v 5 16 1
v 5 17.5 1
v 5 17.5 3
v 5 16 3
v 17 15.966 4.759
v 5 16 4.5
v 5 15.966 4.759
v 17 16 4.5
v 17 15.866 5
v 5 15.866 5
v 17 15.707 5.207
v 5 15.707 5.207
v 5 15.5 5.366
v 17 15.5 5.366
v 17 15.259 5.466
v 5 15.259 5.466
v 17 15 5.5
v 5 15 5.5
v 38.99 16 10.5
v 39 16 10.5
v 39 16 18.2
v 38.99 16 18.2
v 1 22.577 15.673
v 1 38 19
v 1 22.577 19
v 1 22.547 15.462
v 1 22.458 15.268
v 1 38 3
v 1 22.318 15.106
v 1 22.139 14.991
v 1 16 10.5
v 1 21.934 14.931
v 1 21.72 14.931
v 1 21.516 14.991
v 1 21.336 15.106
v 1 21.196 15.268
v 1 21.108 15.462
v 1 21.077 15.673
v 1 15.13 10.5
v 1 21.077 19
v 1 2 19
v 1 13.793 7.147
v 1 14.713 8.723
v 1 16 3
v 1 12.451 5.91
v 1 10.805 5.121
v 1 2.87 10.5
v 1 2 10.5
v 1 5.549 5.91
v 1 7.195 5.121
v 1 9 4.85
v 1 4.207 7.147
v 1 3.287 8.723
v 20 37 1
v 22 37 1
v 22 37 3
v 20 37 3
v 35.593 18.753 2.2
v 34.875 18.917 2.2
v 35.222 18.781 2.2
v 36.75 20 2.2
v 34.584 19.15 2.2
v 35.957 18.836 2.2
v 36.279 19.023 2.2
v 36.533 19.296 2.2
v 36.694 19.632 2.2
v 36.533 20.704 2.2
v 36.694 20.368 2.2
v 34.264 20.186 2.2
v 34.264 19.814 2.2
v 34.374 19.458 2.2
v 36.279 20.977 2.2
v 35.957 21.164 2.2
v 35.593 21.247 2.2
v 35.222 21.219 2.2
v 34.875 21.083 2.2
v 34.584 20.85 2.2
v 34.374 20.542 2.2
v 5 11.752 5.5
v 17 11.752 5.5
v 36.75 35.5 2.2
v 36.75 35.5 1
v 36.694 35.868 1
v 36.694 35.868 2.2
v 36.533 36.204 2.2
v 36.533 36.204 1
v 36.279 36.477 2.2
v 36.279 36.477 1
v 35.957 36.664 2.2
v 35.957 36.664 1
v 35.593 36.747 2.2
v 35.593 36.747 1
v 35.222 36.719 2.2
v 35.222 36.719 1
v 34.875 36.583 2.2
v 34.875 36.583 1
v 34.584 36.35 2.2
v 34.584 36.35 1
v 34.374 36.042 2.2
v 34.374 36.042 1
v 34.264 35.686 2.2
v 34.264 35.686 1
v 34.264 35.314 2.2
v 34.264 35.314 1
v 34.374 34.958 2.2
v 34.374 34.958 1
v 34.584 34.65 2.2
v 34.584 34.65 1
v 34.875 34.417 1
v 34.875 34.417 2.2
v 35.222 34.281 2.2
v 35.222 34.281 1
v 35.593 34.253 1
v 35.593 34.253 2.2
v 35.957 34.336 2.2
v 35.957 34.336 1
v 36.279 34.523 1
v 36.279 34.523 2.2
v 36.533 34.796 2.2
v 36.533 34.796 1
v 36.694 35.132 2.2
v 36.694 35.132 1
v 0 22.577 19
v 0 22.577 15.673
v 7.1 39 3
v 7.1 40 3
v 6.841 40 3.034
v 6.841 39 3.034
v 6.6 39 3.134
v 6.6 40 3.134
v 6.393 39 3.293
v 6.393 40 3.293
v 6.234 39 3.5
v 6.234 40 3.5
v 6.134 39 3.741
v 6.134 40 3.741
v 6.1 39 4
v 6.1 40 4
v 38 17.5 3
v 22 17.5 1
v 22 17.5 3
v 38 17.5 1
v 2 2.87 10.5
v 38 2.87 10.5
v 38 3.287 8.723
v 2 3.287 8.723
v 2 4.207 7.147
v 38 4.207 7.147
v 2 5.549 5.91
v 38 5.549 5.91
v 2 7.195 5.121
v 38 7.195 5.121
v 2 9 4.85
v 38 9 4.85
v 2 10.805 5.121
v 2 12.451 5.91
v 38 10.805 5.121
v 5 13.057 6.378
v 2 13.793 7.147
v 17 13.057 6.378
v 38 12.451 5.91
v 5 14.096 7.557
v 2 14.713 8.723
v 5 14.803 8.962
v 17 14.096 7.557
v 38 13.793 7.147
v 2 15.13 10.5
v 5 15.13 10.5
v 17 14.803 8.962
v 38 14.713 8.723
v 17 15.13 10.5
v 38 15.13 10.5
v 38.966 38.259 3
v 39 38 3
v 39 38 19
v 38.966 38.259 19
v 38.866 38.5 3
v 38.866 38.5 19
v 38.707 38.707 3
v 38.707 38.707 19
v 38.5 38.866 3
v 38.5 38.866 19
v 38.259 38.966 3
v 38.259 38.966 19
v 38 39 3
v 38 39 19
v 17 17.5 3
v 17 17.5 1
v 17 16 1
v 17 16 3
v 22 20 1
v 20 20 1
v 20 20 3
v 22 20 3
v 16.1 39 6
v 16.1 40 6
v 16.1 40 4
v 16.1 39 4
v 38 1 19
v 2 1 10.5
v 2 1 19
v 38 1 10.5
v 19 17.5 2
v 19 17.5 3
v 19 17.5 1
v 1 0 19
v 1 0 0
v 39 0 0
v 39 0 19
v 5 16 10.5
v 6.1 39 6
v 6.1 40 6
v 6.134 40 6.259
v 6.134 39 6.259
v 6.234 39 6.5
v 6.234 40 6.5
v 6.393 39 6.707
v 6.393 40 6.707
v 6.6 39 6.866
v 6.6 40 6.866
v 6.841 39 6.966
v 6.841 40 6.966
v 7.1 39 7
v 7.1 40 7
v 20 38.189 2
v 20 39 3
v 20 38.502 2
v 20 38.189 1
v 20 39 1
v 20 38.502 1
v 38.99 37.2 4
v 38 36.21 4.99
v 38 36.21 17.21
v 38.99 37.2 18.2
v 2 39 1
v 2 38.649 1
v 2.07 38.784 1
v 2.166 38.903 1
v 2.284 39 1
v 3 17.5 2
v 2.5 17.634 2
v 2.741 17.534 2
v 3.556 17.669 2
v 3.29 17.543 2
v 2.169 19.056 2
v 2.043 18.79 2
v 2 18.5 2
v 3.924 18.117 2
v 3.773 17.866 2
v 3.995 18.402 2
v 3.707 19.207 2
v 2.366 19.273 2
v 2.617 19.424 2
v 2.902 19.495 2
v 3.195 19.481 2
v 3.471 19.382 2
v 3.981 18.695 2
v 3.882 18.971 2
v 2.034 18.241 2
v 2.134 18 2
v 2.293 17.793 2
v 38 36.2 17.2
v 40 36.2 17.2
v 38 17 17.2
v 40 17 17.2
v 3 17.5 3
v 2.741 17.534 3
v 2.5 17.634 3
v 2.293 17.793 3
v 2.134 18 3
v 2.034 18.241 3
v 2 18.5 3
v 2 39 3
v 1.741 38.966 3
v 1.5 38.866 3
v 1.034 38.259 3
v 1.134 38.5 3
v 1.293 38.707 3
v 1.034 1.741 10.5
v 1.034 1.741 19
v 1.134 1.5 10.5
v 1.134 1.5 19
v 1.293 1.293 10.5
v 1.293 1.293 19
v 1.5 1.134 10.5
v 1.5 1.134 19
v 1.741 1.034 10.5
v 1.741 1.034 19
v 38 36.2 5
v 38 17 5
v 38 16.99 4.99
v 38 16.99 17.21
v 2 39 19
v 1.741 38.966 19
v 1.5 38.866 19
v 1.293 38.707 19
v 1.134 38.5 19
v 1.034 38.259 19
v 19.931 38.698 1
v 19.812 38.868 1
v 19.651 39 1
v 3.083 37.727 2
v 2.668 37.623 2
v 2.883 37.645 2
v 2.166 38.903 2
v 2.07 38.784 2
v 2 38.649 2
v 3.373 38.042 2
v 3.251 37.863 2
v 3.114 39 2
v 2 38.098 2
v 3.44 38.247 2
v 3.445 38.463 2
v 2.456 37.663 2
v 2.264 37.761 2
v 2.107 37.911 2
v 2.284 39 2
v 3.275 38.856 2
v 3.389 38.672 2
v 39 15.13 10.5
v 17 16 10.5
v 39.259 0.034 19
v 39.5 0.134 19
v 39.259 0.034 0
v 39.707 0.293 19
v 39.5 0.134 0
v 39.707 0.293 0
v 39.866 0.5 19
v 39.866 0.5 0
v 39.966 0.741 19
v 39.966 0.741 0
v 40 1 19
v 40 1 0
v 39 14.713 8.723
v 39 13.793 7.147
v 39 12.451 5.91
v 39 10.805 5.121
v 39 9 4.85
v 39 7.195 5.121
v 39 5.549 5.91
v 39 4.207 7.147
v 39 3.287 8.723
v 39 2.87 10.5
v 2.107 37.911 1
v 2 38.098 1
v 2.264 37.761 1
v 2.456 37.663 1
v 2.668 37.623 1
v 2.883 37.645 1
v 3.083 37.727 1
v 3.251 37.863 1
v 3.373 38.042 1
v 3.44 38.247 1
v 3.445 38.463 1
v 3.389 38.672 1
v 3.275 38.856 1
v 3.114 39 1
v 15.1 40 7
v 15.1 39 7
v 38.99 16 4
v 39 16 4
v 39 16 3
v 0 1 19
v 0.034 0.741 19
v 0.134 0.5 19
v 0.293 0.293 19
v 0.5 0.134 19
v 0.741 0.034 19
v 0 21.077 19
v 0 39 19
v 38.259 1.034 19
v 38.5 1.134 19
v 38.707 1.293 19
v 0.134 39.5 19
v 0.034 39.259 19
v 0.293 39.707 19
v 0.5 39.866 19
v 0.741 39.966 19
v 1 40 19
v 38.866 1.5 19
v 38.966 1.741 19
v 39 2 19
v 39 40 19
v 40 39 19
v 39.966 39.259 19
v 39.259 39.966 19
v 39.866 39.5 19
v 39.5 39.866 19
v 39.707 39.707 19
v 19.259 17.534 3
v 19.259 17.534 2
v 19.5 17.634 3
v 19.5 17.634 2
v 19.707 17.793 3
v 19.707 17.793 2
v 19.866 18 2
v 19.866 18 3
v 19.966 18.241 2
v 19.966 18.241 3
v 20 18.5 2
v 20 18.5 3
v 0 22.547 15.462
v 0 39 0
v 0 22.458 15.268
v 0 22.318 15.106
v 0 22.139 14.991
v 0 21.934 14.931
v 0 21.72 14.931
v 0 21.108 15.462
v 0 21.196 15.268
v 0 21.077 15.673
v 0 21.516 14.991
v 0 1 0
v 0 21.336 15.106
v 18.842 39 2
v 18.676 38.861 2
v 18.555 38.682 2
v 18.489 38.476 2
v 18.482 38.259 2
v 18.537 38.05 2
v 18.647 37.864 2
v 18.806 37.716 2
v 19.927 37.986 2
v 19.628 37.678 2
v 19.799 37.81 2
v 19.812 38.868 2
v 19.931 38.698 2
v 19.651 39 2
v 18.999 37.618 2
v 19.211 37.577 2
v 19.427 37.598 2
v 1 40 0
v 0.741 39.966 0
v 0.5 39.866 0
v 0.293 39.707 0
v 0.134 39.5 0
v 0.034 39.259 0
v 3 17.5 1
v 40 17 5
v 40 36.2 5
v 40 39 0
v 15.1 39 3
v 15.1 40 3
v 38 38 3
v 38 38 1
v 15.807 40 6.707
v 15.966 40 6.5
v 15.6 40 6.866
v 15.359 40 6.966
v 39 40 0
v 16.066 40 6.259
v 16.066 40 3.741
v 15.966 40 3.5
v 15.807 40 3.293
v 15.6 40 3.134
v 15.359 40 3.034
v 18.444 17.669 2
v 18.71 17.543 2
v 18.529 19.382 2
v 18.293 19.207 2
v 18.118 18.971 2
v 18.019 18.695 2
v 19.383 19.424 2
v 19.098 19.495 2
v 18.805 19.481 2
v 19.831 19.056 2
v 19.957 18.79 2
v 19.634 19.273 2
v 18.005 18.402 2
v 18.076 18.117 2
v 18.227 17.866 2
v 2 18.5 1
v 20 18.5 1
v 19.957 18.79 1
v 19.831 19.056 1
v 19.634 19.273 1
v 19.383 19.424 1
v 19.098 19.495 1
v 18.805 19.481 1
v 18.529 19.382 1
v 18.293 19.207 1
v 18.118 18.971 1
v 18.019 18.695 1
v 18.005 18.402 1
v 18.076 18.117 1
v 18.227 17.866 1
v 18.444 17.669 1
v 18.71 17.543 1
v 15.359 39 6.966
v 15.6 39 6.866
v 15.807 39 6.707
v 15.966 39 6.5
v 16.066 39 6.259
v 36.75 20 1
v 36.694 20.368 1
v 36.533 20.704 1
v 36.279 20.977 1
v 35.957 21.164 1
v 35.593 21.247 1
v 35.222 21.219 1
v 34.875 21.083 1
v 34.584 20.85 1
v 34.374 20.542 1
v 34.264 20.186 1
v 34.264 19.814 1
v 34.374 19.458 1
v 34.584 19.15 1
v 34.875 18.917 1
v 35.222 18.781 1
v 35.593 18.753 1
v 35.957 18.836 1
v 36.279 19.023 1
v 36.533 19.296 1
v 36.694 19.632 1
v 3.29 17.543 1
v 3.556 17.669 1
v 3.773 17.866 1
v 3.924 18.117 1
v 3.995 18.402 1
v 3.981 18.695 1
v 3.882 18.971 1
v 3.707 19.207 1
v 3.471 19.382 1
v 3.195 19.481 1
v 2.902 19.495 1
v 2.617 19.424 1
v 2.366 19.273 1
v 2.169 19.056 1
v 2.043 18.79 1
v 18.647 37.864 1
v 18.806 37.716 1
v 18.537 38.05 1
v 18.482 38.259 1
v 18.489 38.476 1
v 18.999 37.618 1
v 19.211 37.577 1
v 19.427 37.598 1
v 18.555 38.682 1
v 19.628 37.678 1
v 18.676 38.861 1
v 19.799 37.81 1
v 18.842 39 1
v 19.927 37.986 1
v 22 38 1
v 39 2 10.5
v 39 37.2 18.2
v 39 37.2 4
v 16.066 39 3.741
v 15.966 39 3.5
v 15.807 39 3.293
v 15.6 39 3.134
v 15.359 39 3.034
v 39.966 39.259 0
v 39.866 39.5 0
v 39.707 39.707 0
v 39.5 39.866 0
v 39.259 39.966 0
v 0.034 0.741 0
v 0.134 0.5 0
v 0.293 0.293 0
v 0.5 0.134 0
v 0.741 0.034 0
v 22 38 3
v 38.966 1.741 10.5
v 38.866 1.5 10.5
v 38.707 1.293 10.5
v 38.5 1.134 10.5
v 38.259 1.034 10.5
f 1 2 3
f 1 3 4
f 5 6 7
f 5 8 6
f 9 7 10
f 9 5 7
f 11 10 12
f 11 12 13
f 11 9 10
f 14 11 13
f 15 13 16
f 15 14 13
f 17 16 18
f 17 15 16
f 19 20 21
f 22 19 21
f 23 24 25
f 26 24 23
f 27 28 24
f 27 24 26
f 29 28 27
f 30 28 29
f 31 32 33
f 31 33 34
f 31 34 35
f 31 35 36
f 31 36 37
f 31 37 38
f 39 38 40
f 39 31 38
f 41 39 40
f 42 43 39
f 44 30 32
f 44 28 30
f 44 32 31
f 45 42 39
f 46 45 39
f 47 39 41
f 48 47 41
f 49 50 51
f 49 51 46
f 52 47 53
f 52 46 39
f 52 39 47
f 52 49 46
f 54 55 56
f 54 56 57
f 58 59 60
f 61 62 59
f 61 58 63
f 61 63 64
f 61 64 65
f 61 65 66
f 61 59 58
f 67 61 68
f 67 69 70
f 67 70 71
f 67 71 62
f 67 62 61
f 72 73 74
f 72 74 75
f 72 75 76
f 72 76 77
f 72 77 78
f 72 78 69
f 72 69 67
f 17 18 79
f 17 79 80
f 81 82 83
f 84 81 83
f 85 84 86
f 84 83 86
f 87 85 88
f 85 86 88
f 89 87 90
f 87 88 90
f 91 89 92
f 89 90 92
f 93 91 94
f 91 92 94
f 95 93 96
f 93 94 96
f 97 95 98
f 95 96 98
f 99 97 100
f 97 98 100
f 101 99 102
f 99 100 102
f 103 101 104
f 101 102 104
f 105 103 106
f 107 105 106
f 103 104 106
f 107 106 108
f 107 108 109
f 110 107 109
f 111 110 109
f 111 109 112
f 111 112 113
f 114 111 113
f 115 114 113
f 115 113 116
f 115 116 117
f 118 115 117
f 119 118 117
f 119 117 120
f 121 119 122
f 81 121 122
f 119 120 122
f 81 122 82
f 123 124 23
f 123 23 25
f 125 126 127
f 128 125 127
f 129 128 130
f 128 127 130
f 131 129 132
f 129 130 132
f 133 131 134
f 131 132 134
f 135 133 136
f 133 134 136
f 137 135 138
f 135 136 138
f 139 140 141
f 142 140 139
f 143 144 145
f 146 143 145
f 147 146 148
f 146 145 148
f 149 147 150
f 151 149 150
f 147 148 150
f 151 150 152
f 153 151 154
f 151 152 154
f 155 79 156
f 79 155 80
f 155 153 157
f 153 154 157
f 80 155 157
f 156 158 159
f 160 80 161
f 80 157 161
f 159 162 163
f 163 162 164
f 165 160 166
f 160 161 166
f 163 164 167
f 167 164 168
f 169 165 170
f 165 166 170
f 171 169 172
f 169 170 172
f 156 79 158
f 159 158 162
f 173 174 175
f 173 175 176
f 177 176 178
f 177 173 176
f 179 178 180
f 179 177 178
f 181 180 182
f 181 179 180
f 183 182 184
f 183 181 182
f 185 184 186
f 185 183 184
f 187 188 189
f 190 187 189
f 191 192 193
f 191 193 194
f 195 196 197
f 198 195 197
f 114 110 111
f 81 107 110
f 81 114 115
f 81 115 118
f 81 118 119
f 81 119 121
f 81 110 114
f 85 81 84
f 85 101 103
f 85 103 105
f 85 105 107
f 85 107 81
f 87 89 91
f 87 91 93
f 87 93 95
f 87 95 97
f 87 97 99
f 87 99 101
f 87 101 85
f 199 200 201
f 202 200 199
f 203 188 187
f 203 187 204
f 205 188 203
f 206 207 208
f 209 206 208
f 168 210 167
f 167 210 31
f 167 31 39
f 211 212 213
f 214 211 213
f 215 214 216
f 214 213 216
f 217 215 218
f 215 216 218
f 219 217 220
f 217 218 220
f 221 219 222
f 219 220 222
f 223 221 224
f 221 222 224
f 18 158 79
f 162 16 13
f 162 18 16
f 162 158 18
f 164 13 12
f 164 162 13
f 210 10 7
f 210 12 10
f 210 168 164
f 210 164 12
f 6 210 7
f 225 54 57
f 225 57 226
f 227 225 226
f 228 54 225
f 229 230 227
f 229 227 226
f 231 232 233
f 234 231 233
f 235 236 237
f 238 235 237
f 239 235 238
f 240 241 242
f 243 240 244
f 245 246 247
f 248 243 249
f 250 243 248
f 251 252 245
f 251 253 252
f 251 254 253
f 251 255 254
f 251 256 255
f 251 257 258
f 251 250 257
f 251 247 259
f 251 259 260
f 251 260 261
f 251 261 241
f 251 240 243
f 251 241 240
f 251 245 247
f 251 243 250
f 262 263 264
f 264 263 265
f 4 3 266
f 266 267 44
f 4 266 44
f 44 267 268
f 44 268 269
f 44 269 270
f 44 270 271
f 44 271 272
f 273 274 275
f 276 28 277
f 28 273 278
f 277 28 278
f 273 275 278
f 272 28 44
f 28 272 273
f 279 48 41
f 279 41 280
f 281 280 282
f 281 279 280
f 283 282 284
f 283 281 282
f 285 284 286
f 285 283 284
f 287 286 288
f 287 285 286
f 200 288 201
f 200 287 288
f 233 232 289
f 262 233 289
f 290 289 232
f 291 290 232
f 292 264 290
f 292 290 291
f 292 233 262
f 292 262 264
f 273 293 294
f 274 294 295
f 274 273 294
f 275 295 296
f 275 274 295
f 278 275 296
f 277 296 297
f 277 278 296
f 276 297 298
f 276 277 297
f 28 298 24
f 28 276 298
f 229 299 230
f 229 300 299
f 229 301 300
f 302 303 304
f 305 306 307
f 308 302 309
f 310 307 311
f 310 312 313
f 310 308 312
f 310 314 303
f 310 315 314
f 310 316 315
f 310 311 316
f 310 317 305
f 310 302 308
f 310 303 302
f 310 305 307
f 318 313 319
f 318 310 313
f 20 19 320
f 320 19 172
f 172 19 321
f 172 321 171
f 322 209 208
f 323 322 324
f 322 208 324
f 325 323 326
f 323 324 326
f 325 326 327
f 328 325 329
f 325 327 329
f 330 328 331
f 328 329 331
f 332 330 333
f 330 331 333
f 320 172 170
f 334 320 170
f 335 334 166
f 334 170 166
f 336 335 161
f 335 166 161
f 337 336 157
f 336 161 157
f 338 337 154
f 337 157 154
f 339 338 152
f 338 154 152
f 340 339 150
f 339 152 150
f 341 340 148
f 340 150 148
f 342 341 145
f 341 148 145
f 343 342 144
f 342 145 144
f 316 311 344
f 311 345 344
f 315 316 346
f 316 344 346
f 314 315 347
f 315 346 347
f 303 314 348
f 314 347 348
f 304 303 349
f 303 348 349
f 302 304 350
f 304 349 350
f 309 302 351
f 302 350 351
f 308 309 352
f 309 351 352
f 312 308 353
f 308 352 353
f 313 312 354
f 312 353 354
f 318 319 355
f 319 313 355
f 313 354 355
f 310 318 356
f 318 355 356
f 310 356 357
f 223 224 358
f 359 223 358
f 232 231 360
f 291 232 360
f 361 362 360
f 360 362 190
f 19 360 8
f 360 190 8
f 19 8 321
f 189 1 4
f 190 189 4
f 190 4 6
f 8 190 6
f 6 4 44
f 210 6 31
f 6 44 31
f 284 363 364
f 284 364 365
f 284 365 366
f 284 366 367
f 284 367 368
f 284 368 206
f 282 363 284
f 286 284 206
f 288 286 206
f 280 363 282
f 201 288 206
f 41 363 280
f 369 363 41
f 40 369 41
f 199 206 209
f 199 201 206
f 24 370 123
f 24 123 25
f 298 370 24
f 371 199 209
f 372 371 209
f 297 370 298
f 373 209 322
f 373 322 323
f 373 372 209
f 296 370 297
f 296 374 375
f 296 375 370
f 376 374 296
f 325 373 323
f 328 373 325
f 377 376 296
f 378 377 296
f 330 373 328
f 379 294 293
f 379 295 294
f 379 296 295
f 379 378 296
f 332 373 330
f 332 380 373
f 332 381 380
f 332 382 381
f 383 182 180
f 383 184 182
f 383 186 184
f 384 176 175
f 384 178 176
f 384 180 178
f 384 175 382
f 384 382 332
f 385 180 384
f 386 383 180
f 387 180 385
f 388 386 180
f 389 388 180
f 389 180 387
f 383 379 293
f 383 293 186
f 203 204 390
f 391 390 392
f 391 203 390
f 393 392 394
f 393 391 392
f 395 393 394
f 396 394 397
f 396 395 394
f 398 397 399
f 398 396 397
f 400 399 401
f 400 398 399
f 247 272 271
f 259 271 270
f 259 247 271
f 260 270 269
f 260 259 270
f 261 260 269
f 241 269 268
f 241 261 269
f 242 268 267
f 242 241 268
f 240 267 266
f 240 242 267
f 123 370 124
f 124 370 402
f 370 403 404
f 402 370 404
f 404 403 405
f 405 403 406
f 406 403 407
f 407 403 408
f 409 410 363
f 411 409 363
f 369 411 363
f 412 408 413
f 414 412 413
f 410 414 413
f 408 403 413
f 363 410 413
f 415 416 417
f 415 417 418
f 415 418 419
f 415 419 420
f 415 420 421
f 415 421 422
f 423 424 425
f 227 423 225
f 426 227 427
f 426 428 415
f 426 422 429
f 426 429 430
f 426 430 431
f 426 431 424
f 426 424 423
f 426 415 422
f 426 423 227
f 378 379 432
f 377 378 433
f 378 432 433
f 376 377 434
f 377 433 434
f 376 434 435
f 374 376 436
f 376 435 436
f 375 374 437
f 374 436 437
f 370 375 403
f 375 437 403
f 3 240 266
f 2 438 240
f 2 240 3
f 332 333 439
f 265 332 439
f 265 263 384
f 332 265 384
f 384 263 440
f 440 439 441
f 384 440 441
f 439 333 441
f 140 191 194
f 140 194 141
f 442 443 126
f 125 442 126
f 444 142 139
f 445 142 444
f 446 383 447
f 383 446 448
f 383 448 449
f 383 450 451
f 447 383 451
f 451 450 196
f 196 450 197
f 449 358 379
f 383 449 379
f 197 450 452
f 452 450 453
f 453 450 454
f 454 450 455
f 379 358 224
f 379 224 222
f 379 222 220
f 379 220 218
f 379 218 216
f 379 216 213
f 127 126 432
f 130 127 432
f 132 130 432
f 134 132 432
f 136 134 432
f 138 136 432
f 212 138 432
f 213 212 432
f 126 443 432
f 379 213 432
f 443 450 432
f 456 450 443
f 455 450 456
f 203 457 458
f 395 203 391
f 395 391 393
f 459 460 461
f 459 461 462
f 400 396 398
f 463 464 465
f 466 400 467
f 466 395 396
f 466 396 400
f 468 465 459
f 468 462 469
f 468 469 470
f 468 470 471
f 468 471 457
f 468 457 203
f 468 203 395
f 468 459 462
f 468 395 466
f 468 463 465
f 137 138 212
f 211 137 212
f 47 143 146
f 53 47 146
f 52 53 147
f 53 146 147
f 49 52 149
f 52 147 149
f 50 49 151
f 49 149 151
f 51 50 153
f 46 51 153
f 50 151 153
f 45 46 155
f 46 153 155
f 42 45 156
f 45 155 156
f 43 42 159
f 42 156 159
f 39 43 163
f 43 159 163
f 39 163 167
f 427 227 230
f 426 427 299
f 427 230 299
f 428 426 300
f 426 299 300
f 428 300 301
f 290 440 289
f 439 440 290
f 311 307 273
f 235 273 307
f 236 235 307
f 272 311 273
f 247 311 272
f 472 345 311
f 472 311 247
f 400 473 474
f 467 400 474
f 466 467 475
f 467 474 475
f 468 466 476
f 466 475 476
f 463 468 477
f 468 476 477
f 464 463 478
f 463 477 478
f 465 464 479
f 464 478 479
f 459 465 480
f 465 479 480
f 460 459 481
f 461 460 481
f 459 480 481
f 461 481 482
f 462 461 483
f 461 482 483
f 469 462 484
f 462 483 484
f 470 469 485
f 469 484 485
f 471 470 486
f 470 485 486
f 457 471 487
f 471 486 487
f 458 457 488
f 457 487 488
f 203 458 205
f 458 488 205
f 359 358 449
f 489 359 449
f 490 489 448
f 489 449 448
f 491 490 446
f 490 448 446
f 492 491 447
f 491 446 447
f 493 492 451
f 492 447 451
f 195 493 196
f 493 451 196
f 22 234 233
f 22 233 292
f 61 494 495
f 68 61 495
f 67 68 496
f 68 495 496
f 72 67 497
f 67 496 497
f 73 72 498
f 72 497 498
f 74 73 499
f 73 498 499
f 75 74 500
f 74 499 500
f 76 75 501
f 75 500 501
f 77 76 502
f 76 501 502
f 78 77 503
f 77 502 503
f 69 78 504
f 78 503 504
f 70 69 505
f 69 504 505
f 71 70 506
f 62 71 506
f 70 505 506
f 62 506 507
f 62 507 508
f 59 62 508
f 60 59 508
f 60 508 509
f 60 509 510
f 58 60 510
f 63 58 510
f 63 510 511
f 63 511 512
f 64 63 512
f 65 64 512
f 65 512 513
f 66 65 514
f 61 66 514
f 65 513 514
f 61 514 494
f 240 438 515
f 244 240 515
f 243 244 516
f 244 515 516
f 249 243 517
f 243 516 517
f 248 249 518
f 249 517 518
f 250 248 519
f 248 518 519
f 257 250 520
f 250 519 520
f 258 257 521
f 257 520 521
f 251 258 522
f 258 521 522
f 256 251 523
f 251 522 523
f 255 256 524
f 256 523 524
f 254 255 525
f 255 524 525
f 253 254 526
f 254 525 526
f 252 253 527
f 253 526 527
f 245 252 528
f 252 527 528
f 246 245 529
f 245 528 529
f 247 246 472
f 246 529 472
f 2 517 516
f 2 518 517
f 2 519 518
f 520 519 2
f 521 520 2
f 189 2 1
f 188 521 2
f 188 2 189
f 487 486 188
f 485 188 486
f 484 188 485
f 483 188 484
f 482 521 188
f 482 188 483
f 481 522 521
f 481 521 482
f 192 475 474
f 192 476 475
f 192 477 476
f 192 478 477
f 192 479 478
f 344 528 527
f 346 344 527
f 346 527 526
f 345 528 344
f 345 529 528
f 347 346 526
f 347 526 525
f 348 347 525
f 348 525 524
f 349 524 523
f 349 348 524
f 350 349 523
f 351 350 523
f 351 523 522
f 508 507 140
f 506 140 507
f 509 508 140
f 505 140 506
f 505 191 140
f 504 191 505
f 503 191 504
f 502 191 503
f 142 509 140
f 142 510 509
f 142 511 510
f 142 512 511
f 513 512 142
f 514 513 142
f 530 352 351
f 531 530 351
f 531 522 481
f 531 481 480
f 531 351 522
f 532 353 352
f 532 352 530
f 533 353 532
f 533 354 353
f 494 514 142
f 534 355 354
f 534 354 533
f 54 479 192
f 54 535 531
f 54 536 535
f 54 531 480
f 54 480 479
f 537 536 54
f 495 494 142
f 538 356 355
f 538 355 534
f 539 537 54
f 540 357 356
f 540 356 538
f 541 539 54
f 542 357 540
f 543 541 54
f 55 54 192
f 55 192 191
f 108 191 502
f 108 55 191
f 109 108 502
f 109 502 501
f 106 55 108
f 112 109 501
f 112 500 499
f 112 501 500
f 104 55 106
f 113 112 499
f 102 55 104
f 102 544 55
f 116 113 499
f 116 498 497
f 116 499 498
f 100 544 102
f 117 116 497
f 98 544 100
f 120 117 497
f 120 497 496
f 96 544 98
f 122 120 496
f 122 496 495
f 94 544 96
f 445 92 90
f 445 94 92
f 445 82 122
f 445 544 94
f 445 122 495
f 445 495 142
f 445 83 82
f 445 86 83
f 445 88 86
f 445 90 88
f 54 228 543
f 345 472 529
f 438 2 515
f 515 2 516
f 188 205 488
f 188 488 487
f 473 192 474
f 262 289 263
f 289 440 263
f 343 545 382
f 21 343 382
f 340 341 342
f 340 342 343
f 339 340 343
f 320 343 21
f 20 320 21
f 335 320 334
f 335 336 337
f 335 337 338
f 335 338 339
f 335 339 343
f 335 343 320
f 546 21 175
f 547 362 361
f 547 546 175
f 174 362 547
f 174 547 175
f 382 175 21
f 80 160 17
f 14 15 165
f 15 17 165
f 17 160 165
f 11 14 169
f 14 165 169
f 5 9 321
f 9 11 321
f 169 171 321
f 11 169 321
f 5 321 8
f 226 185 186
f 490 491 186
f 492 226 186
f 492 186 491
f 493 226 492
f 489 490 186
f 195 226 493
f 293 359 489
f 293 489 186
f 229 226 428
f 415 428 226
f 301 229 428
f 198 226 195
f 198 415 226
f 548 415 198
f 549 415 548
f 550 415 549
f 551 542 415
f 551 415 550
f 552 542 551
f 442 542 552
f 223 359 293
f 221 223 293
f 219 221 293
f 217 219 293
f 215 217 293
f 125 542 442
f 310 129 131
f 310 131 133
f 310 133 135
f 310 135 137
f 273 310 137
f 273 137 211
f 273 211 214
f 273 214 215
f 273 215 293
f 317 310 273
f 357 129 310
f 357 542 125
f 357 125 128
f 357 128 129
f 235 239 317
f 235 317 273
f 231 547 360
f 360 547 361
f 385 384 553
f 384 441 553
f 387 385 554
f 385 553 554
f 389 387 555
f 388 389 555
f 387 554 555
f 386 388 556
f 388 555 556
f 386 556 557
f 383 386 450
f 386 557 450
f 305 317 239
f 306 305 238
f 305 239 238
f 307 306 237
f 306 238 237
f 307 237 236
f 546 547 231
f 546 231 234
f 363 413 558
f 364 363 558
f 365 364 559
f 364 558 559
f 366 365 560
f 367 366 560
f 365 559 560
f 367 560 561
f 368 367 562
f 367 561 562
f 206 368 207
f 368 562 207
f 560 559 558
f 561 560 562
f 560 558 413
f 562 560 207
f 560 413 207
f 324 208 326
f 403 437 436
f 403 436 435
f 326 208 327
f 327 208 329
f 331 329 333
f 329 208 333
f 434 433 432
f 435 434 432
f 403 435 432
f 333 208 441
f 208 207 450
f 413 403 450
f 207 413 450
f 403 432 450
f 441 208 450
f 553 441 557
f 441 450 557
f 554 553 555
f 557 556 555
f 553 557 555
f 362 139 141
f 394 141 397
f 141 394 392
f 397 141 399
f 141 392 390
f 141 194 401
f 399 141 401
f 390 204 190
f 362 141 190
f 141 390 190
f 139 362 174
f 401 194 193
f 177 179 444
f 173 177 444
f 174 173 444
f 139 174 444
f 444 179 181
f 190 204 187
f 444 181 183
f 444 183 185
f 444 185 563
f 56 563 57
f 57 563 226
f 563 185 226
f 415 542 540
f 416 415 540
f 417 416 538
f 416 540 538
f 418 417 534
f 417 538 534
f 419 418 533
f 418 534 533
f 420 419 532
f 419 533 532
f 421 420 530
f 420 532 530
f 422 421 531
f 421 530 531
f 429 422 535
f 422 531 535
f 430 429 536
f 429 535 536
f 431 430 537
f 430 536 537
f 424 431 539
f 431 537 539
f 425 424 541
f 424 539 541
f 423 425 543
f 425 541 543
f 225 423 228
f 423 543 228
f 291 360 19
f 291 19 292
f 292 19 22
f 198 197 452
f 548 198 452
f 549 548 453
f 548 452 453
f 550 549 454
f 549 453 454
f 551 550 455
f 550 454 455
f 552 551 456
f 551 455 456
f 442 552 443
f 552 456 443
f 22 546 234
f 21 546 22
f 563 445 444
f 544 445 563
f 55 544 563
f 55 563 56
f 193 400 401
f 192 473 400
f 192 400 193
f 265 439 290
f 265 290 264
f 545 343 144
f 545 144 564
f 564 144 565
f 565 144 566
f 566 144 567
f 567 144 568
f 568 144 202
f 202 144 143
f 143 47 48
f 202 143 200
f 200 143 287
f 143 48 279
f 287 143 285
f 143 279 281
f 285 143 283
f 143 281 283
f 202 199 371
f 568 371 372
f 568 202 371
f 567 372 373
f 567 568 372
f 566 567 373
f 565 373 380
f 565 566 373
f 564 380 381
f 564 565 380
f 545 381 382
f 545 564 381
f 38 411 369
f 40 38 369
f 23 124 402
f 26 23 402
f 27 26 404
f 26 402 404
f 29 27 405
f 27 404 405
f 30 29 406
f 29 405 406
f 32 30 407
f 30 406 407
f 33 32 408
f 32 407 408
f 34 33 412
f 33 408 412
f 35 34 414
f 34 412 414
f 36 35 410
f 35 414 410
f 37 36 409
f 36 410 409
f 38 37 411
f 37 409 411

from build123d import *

# Parameters (mm, degrees)
PAD_DEPTH       = 1
PAD001_DEPTH    = 18
SKETCH002_W     = 19.2
SKETCH002_H     = 12.2
POCKET_DEPTH    = 5
SKETCH003_W     = 21.2
SKETCH003_H     = 14.2
SKETCH003_W_2   = 19.2
SKETCH003_H_2   = 12.2
PAD002_DEPTH    = 1
CHAMFER_SIZE    = 0.99
PAD003_DEPTH    = 2
CHAMFER001_SIZE = 1.8
SKETCH005_W     = 36
SKETCH005_H     = 15
PAD004_DEPTH    = 2.5
PAD004_FACE29_W = 15
PAD004_FACE29_H = 36
PAD005_DEPTH    = 10
SKETCH006_R     = 1
SKETCH006_R_2   = 0.751416
SKETCH006_R_3   = 0.769216
PAD006_DEPTH    = 1
SKETCH007_R     = 1.25
PAD007_DEPTH    = 1.2
PAD007_FACE39_W = 15
PAD007_FACE39_H = 36
POCKET001_DEPTH = 5
SKETCH008_R     = 6.15
POCKET002_DEPTH = 19
PAD008_DEPTH    = 1
PAD009_DEPTH    = 1
SKETCH009_W     = 12
SKETCH009_H     = 5
POCKET003_DEPTH = 5
FILLET_R        = 1
POCKET004_DEPTH = 5
POCKET005_DEPTH = 5


with BuildPart() as part:
    # Sketch → Pad (new body)
    with BuildSketch(Plane.XY):
        with BuildLine():
            Line((1, 0), (39, 0))
            ThreePointArc((39, 0), (39.707107, 0.292893), (40, 1))
            Line((40, 1), (40, 39))
            ThreePointArc((40, 39), (39.707107, 39.707107), (39, 40))
            Line((39, 40), (1, 40))
            ThreePointArc((1, 40), (0.292893, 39.707107), (0, 39))
            Line((0, 39), (0, 1))
            ThreePointArc((0, 1), (0.292893, 0.292893), (1, 0))
        make_face()
    extrude(amount=PAD_DEPTH)

    # Sketch001 (on Face10 of Pad) → Pad001 (join)
    with BuildSketch(Plane.XY.offset(1)):
        with BuildLine():
            Line((1, 0), (39, 0))
            ThreePointArc((39, 0), (39.707107, 0.292893), (40, 1))
            Line((40, 1), (40, 39))
            ThreePointArc((40, 39), (39.707107, 39.707107), (39, 40))
            Line((39, 40), (1, 40))
            ThreePointArc((1, 40), (0.292893, 39.707107), (0, 39))
            Line((0, 39), (0, 1))
            ThreePointArc((0, 1), (0.292893, 0.292893), (1, 0))
        make_face()
        with BuildLine():
            Line((2, 1), (38, 1))
            ThreePointArc((38, 1), (38.707107, 1.292893), (39, 2))
            Line((39, 2), (39, 38))
            ThreePointArc((39, 38), (38.707107, 38.707107), (38, 39))
            Line((38, 39), (2, 39))
            ThreePointArc((2, 39), (1.292893, 38.707107), (1, 38))
            Line((1, 38), (1, 2))
            ThreePointArc((1, 2), (1.292893, 1.292893), (2, 1))
        make_face(mode=Mode.SUBTRACT)
    extrude(amount=PAD001_DEPTH)

    # Sketch002 (on Face14 of Pad001) → Pocket (cut)
    with BuildSketch(Plane.YZ.offset(40)):
        with Locations((26.6, 11.1)):
            Rectangle(SKETCH002_W, SKETCH002_H)
    extrude(amount=-POCKET_DEPTH, mode=Mode.SUBTRACT)

    # Sketch003 (on Face17 of Pocket) → Pad002 (join)
    with BuildSketch(Plane(origin=(39, 0, 0), x_dir=(0, -1, 0), z_dir=(-1, 0, 0))):
        with Locations((-26.6, 11.1)):
            Rectangle(SKETCH003_W, SKETCH003_H)
        with Locations((-26.6, 11.1)):
            Rectangle(SKETCH003_W_2, SKETCH003_H_2, mode=Mode.SUBTRACT)
    extrude(amount=PAD002_DEPTH)

    # Chamfer
    chamfer_edges = [part.edges().sort_by_distance(p)[0] for p in [
        (38, 26.6, 18.2),
        (38, 16, 11.1),
        (38, 26.6, 4),
        (38, 37.2, 11.1),
    ]]
    chamfer(chamfer_edges, length=CHAMFER_SIZE)

    # Sketch004 (on Face11 of Chamfer) → Pad003 (join)
    with BuildSketch(Plane.XY.offset(1)):
        with BuildLine():
            Line((2, 39), (2, 18.5))
            ThreePointArc((2, 18.5), (2.292893, 17.792893), (3, 17.5))
            Line((3, 17.5), (5, 17.5))
            Line((5, 17.5), (5, 14))
            Line((5, 14), (17, 14))
            Line((17, 17.5), (17, 14))
            Line((17, 17.5), (19, 17.5))
            ThreePointArc((19, 17.5), (19.707107, 17.792893), (20, 18.5))
            Line((20, 18.5), (20, 20))
            Line((20, 20), (22, 20))
            Line((22, 20), (22, 17.5))
            Line((22, 17.5), (38, 17.5))
            Line((38, 17.5), (38, 38))
            Line((38, 38), (22, 38))
            Line((22, 38), (22, 37))
            Line((22, 37), (20, 37))
            Line((20, 37), (20, 39))
            Line((20, 39), (39, 39))
            Line((39, 1), (39, 39))
            Line((1, 1), (39, 1))
            Line((1, 39), (1, 1))
            Line((1, 39), (2, 39))
        make_face()
    extrude(amount=PAD003_DEPTH)

    # Chamfer001
    chamfer001_edges = [part.edges().sort_by_distance(p)[0] for p in [
        (11, 14, 3),
    ]]
    chamfer(chamfer001_edges, length=CHAMFER001_SIZE)

    # Sketch005 (on Face1 of Chamfer001) → Pad004 (join, symmetric)
    with BuildSketch(Plane.XY.offset(3)):
        with Locations((20, 8.5)):
            Rectangle(SKETCH005_W, SKETCH005_H)
    extrude(amount=PAD004_DEPTH, both=True)

    # Pad004 Face29 → Pad005 (add)
    with BuildSketch(Plane(origin=(20, 8.5, 5.5), x_dir=(0, 1, 0), z_dir=(0, 0, 1))):
        Rectangle(PAD004_FACE29_W, PAD004_FACE29_H)
    extrude(amount=PAD005_DEPTH)

    # Sketch006 (on Face18 of Pad005) → Pad006 (join)
    with BuildSketch(Plane.XY.offset(1)):
        with Locations((3, 18.5)):
            Circle(SKETCH006_R)
        with Locations((19, 18.5)):
            Circle(SKETCH006_R)
        with Locations((2.699211, 38.373474)):
            Circle(SKETCH006_R_2)
        with Locations((19.24682, 38.345665)):
            Circle(SKETCH006_R_3)
    extrude(amount=PAD006_DEPTH)

    # Sketch007 (on Face20 of Pad006) → Pad007 (join)
    with BuildSketch(Plane.XY.offset(1)):
        with Locations((35.5, 35.5)):
            Circle(SKETCH007_R)
        with Locations((35.5, 20)):
            Circle(SKETCH007_R)
    extrude(amount=PAD007_DEPTH)

    # Pad007 Face39 → Pocket001 (cut)
    with BuildSketch(Plane(origin=(20, 8.5, 15.5), x_dir=(0, 1, 0), z_dir=(0, 0, 1))):
        Rectangle(PAD007_FACE39_W, PAD007_FACE39_H)
    extrude(amount=-POCKET001_DEPTH, mode=Mode.SUBTRACT)

    # Sketch008 (on DatumPlane) → Pocket002 (cut, symmetric)
    with BuildSketch(Plane.YZ.offset(20)):
        with Locations((9, 11)):
            Circle(SKETCH008_R)
    extrude(amount=POCKET002_DEPTH, both=True, mode=Mode.SUBTRACT)

    # Pocket002 Face46 → Pad008 (add)
    with BuildSketch(Plane(origin=(2, 8.050341, 5.520041), x_dir=(0, 1, 0), z_dir=(-1, 0, 0))):
        with BuildLine():
            Line((7.949659, 2.520041), (-7.050341, 2.520041))
            Line((-7.050341, 2.520041), (-7.050341, -4.979959))
            Line((-7.050341, -4.979959), (-5.179982, -4.979959))
            ThreePointArc((-5.179982, -4.979959), (0.949659, 0.670041), (7.0793, -4.979959))
            Line((7.0793, -4.979959), (7.949659, -4.979959))
            Line((7.949659, -4.979959), (7.949659, 2.520041))
        make_face()
    extrude(amount=PAD008_DEPTH)

    # Pad008 Face32 → Pad009 (add)
    with BuildSketch(Plane(origin=(38, 8.050341, 5.520041), x_dir=(0, -1, 0), z_dir=(1, 0, 0))):
        with BuildLine():
            Line((7.050341, 2.520041), (-7.949659, 2.520041))
            Line((-7.949659, 2.520041), (-7.949659, -4.979959))
            Line((-7.949659, -4.979959), (-7.0793, -4.979959))
            ThreePointArc((-7.0793, -4.979959), (-0.949659, 0.670041), (5.179982, -4.979959))
            Line((5.179982, -4.979959), (7.050341, -4.979959))
            Line((7.050341, -4.979959), (7.050341, 2.520041))
        make_face()
    extrude(amount=PAD009_DEPTH)

    # Sketch009 (on Face69 of Pad009) → Pocket003 (cut)
    with BuildSketch(Plane.XY.offset(10.5)):
        with Locations((11, 13.5)):
            Rectangle(SKETCH009_W, SKETCH009_H)
    extrude(amount=-POCKET003_DEPTH, mode=Mode.SUBTRACT)

    # Fillet
    fillet_edges = [part.edges().sort_by_distance(p)[0] for p in [
        (11, 16, 5.5),
    ]]
    fillet(fillet_edges, radius=FILLET_R)

    # Sketch010 (on Face62 of Fillet) → Pocket004 (cut)
    with BuildSketch(Plane(origin=(0, 0, 0), x_dir=(0, -1, 0), z_dir=(-1, 0, 0))):
        with BuildLine():
            ThreePointArc((-22.577213, 15.673276), (-21.827213, 14.923276), (-21.077213, 15.673276))
            Line((-21.077213, 15.673276), (-21.077213, 20.673276))
            ThreePointArc((-21.077213, 20.673276), (-21.827213, 21.423276), (-22.577213, 20.673276))
            Line((-22.577213, 15.673276), (-22.577213, 20.673276))
        make_face()
    extrude(amount=-POCKET004_DEPTH, mode=Mode.SUBTRACT)

    # Sketch013 (on Face63 of Pocket004) → Pocket005 (cut)
    with BuildSketch(Plane(origin=(0, 40, 0), x_dir=(-1, 0, 0), z_dir=(0, 1, 0))):
        with BuildLine():
            Line((-6.1, 4), (-6.1, 6))
            ThreePointArc((-6.1, 6), (-6.392893, 6.707107), (-7.1, 7))
            Line((-7.1, 7), (-15.1, 7))
            ThreePointArc((-15.1, 7), (-15.807107, 6.707107), (-16.1, 6))
            Line((-16.1, 6), (-16.1, 4))
            ThreePointArc((-16.1, 4), (-15.807107, 3.292893), (-15.1, 3))
            Line((-15.1, 3), (-7.1, 3))
            ThreePointArc((-7.1, 3), (-6.392893, 3.292893), (-6.1, 4))
        make_face()
    extrude(amount=-POCKET005_DEPTH, mode=Mode.SUBTRACT)


solid = part.part
